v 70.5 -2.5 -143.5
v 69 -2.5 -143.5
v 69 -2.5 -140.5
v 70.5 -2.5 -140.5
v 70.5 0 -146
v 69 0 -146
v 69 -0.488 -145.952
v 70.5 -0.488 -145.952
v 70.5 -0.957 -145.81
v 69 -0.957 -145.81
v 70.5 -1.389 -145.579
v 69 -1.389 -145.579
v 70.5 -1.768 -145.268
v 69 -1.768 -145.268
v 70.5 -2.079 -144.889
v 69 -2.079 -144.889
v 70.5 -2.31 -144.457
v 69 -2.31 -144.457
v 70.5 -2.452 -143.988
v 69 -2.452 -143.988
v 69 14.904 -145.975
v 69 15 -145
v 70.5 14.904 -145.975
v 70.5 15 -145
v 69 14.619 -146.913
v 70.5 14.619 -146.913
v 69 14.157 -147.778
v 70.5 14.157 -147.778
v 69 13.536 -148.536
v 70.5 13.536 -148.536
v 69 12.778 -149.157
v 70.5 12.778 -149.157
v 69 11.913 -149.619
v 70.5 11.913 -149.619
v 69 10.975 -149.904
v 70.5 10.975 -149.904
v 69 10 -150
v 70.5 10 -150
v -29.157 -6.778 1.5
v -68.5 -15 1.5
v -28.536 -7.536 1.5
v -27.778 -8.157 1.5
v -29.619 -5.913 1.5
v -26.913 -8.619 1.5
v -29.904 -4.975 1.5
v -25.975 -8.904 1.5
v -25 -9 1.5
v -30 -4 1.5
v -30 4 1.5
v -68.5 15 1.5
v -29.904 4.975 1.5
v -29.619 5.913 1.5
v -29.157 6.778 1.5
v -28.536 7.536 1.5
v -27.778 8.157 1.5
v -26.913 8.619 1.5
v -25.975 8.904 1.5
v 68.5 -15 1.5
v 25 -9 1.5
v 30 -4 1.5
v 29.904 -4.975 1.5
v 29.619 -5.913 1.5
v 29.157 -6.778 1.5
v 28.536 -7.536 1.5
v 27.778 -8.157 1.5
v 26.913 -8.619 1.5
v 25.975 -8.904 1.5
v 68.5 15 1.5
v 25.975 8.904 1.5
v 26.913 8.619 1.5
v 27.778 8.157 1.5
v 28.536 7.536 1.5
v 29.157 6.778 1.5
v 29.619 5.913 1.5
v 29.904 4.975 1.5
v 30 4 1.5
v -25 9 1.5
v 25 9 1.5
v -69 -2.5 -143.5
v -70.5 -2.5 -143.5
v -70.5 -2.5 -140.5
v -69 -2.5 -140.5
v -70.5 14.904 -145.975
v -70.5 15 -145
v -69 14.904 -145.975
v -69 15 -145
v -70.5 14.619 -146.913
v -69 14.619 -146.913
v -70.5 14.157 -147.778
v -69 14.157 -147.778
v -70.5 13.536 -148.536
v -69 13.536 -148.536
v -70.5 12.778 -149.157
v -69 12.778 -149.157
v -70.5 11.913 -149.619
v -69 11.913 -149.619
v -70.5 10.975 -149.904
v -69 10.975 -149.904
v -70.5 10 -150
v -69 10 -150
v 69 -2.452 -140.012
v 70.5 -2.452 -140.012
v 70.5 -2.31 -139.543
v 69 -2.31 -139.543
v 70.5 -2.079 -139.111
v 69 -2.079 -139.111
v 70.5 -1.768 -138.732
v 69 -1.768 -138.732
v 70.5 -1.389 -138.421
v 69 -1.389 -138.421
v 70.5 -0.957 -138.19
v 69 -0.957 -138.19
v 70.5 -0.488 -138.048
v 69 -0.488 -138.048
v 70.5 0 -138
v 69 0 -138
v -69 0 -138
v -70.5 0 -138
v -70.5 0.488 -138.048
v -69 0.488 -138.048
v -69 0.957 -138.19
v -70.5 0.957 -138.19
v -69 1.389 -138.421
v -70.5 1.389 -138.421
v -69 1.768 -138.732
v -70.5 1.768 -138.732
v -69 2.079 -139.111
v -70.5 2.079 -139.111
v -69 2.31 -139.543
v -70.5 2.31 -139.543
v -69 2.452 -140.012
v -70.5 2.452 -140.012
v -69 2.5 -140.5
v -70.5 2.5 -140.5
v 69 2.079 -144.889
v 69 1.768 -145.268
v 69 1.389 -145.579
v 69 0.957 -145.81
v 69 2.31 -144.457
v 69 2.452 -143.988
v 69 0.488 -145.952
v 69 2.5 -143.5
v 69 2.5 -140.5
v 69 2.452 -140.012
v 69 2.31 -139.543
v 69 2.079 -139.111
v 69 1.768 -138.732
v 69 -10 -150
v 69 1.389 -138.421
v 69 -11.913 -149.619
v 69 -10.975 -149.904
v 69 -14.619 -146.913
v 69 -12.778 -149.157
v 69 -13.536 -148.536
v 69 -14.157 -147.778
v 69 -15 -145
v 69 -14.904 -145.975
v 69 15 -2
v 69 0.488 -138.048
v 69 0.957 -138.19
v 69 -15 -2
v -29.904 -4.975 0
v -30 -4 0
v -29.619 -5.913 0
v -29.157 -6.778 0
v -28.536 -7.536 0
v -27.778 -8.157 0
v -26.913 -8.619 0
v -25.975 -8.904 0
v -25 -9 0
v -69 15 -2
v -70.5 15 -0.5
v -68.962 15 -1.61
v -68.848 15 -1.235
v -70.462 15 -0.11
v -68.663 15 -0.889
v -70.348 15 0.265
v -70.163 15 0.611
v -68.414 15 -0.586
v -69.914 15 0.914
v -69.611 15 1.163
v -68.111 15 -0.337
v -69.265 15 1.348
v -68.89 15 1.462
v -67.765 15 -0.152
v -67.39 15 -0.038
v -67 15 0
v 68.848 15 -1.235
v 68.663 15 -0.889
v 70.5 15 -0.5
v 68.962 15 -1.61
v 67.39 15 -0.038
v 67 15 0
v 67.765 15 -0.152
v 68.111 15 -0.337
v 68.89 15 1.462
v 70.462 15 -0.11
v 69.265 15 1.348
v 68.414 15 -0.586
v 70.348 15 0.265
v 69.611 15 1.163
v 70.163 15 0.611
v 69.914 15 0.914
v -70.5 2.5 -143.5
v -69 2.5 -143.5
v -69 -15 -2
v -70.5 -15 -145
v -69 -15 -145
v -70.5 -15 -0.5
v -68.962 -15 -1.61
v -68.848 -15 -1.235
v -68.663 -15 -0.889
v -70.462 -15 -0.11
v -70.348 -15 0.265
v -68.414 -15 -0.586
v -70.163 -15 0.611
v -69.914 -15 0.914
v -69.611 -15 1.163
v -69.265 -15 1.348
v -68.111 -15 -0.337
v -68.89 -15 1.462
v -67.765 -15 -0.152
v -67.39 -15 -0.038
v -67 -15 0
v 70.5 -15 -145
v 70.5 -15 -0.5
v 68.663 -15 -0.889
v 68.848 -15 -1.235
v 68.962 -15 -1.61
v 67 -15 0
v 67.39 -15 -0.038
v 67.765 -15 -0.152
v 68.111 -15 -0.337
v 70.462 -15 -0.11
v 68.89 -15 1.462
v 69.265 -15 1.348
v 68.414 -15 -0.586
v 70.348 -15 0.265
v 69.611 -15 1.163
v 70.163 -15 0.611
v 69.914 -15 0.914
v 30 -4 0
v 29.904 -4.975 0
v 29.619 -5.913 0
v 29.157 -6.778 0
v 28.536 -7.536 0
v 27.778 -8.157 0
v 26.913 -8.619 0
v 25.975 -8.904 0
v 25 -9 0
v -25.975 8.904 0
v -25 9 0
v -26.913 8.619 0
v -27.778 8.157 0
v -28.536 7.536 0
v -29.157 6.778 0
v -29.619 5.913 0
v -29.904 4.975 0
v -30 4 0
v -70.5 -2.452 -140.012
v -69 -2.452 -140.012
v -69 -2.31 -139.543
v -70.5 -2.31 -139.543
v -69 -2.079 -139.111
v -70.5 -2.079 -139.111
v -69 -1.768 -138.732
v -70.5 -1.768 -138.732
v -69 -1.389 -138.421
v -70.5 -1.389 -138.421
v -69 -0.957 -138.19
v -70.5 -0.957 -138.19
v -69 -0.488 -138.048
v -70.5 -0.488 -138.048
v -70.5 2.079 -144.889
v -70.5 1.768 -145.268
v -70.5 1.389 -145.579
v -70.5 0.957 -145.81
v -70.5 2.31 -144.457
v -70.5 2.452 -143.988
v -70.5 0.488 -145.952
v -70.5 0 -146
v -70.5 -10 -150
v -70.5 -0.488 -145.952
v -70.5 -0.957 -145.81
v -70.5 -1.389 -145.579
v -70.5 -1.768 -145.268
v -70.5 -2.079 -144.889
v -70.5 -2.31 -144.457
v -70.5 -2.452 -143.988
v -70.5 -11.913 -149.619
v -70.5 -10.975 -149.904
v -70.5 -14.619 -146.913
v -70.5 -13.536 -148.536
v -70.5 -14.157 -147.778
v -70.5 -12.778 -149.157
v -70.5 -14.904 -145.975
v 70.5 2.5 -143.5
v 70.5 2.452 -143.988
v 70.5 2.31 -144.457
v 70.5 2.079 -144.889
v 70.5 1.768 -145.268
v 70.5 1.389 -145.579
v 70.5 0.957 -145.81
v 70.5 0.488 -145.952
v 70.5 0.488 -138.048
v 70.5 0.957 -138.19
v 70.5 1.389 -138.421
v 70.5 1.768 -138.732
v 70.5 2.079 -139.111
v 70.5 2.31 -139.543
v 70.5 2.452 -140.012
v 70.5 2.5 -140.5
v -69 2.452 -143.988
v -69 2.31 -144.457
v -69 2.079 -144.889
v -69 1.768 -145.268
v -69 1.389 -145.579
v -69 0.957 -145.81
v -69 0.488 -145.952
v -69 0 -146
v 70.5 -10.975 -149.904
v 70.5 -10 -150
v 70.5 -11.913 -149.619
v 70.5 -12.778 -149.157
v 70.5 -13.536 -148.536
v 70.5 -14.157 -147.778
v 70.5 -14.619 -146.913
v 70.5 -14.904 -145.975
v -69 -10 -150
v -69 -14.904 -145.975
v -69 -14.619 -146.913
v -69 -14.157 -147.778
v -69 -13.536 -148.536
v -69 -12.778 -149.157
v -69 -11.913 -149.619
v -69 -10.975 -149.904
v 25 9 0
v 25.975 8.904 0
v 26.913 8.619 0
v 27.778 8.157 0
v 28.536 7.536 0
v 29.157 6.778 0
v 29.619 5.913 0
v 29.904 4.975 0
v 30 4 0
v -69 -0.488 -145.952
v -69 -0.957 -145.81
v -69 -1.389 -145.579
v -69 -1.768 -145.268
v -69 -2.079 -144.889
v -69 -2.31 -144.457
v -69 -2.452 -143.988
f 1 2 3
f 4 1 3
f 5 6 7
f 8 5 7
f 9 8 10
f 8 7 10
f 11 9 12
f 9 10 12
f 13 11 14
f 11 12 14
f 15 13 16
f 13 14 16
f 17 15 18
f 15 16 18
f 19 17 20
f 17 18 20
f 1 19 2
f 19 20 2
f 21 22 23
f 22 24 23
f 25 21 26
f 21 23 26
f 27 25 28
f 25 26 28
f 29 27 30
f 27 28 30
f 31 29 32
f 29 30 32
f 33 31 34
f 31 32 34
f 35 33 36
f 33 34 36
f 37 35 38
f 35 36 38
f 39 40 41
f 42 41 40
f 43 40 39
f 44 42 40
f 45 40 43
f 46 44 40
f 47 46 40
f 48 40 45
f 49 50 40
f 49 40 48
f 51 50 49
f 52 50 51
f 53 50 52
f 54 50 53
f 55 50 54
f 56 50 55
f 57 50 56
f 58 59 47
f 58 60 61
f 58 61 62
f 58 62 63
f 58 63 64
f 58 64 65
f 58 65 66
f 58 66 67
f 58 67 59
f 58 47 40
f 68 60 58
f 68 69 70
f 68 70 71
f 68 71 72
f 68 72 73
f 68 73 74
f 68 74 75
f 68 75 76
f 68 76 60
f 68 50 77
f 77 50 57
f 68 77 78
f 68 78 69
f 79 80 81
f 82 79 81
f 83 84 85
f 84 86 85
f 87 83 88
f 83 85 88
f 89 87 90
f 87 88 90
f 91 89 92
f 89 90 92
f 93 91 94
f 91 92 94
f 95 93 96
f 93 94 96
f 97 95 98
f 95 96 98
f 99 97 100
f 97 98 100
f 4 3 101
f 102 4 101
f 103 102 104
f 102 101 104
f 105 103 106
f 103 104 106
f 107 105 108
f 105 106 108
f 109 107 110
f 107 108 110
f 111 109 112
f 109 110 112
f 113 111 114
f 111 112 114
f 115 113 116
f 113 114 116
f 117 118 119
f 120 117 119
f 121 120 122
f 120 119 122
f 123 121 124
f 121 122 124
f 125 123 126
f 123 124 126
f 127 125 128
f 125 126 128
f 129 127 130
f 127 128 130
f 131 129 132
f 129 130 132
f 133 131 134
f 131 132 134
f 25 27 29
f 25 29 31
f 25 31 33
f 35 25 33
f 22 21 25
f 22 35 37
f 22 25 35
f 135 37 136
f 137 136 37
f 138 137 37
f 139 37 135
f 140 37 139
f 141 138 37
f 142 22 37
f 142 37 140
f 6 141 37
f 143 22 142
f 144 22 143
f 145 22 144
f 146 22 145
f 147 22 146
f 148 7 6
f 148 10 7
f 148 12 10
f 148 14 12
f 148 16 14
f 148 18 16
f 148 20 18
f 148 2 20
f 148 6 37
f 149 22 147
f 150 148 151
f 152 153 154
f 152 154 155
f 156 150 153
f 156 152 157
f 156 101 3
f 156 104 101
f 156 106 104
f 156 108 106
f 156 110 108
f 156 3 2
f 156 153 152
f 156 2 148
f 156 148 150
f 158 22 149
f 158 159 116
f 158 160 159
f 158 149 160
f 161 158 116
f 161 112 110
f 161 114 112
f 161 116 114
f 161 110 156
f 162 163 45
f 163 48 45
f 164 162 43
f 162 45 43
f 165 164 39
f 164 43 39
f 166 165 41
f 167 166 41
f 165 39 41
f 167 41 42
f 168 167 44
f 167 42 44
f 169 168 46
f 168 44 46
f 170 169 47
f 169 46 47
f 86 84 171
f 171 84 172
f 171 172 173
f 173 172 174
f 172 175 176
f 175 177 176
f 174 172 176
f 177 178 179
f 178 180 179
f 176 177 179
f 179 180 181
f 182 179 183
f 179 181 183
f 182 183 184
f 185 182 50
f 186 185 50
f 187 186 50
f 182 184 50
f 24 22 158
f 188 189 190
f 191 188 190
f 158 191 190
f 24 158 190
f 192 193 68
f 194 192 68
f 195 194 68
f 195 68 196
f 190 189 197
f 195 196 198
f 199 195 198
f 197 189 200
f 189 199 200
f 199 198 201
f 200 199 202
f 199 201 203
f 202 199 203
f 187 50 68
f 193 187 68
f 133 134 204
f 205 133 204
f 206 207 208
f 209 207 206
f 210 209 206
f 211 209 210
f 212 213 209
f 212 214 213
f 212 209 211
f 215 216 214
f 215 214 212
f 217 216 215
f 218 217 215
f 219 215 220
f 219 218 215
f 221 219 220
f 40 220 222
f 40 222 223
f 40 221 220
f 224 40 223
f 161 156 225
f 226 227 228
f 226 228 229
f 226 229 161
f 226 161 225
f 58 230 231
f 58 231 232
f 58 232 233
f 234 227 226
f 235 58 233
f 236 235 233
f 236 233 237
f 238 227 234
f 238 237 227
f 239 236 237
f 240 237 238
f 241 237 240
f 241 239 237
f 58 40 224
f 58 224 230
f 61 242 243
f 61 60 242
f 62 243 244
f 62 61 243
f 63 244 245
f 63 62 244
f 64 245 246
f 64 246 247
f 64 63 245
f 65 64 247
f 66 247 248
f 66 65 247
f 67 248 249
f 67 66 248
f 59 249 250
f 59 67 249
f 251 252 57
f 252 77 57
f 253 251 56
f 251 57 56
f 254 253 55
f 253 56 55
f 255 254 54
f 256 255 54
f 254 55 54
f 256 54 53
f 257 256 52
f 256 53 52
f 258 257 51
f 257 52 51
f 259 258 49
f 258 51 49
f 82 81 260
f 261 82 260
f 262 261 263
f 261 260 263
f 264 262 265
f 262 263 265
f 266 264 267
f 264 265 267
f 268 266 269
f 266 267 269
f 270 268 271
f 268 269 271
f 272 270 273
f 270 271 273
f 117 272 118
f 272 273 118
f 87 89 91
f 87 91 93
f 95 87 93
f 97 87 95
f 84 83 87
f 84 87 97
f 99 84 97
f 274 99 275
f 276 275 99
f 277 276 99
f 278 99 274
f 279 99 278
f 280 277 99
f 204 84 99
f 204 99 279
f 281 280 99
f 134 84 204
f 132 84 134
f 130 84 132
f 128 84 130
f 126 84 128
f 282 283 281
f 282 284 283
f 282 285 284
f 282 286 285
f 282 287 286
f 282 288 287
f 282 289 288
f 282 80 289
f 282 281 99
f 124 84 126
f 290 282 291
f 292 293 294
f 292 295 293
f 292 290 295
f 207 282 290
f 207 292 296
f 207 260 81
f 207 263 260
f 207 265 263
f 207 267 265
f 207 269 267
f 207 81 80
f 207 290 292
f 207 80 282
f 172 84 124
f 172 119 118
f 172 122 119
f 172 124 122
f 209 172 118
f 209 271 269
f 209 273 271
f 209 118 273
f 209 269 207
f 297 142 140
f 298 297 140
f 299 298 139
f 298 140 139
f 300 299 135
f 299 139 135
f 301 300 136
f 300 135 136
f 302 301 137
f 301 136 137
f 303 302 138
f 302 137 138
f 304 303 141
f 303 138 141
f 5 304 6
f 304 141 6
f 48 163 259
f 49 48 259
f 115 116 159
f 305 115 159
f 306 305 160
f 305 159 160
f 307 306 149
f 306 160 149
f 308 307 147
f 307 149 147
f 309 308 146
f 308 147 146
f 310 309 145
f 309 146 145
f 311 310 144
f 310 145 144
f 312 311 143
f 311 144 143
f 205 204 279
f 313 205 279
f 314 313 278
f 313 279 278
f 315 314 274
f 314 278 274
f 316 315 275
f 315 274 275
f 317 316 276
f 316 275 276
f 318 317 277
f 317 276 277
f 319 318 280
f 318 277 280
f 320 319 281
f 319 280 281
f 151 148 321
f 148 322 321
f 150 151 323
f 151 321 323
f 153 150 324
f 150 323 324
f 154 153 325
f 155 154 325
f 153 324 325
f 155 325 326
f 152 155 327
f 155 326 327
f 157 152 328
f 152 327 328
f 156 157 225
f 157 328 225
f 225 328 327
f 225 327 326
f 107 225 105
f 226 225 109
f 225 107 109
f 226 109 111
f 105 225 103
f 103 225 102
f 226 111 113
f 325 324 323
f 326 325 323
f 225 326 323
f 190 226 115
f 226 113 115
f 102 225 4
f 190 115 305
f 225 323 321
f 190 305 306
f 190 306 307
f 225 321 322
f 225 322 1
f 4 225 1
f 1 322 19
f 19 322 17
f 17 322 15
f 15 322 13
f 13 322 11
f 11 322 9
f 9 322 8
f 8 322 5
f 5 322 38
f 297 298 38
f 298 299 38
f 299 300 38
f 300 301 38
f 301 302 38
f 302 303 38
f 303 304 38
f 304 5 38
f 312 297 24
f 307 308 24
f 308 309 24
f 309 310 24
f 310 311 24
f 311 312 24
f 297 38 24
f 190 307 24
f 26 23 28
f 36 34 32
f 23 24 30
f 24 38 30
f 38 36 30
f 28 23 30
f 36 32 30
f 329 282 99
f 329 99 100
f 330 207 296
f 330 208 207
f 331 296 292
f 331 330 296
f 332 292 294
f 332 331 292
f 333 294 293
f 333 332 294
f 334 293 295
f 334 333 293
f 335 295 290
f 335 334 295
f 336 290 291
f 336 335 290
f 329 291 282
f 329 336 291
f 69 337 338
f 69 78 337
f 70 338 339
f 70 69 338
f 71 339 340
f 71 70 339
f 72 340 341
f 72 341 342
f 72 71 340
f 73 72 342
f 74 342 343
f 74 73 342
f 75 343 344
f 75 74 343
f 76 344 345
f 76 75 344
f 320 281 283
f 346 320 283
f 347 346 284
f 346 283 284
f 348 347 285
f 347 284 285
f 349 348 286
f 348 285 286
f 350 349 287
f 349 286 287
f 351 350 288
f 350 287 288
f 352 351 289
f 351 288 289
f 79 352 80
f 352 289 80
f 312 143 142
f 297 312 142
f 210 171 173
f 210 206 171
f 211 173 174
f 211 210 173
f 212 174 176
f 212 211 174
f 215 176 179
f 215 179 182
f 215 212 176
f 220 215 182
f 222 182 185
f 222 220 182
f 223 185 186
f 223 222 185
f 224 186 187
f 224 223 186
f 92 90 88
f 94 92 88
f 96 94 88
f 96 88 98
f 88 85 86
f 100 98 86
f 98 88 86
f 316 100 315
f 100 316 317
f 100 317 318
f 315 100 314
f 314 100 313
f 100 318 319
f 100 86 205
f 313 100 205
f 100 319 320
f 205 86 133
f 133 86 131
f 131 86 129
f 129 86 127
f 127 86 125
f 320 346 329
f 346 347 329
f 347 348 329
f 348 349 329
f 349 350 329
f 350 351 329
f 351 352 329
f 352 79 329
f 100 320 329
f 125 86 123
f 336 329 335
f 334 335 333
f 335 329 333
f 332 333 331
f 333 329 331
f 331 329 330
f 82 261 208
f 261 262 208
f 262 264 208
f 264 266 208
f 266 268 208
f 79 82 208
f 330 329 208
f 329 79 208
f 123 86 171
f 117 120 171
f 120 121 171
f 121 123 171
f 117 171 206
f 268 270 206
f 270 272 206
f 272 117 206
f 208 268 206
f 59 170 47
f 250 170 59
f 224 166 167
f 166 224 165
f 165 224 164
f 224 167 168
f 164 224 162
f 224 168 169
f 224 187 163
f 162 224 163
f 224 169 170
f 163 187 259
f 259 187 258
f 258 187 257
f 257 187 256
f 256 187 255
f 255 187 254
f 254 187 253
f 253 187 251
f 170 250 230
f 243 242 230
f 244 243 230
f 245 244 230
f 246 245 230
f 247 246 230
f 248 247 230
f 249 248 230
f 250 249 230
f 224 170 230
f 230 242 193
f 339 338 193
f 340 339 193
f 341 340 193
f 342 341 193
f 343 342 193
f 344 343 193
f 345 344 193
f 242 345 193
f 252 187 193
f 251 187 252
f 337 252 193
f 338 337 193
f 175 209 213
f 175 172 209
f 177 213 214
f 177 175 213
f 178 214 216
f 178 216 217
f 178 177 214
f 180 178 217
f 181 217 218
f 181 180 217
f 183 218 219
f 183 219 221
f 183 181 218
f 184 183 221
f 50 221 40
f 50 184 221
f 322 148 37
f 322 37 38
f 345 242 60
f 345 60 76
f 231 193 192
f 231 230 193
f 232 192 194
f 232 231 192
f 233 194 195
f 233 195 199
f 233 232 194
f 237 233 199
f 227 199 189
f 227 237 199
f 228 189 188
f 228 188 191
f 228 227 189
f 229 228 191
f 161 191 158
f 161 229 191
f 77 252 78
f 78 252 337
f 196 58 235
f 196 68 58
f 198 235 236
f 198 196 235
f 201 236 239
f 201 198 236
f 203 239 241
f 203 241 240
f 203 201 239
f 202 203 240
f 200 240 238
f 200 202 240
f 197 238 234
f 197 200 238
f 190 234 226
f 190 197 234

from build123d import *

# Parameters (mm, degrees)
F0_W     = 141
F0_H     = 30
F0_W_2   = 60
F0_H_2   = 18
F1_DEPTH = 1.5
F2_W     = 1.5
F2_H     = 30
F3_DEPTH = 150
F4_R     = 5
F7_DEPTH = 200
F8_R     = 2


# Not quite as in the source:
# - two fillets or chamfers of one size are made in one step


with BuildPart() as f1:
    # F0 (on Top) → F1 (new body)
    with BuildSketch(Plane.XY):
        Rectangle(F0_W, F0_H)
        Rectangle(F0_W_2, F0_H_2, mode=Mode.SUBTRACT)
    extrude(amount=F1_DEPTH)

    # F2 (on face) → F3 (join)
    with BuildSketch(Plane(origin=(0, 0, 0), x_dir=(1, 0, 0), z_dir=(0, 0, -1))):
        with Locations((-69.75, 0)):
            Rectangle(F2_W, F2_H)
        with Locations((69.75, 0)):
            Rectangle(F2_W, F2_H)
    extrude(amount=F3_DEPTH)

    # F4
    f4_edges = [f1.edges().sort_by_distance(p)[0] for p in [
        (30, 9, 0.75),
        (30, -9, 0.75),
        (-30, -9, 0.75),
        (-30, 9, 0.75),
        (-69.75, 15, -150),
        (69.75, 15, -150),
        (69.75, -15, -150),
        (-69.75, -15, -150),
    ]]
    fillet(f4_edges, radius=F4_R)

    # F6 (on face) → F7 (cut)
    with BuildSketch(Plane(origin=(-70.5, 0, 0), x_dir=(0, -1, 0), z_dir=(-1, 0, 0))):
        with BuildLine():
            Line((-2.5, -140.5), (-2.5, -143.5))
            ThreePointArc((-2.5, -143.5), (-1.767766953, -145.267766953), (0, -146))
            ThreePointArc((0, -146), (1.767766953, -145.267766953), (2.5, -143.5))
            Line((2.5, -143.5), (2.5, -140.5))
            ThreePointArc((2.5, -140.5), (1.767766953, -138.732233047), (0, -138))
            ThreePointArc((0, -138), (-1.767766953, -138.732233047), (-2.5, -140.5))
        make_face()
    extrude(amount=-F7_DEPTH, mode=Mode.SUBTRACT)

    # F8
    f8_edges = [f1.edges().sort_by_distance(p)[0] for p in [
        (70.5, 0, 1.5),
        (-70.5, 0, 1.5),
        (-69, 0, 0),
        (69, 0, 0),
    ]]
    fillet(f8_edges, radius=F8_R)


solid = f1.part
